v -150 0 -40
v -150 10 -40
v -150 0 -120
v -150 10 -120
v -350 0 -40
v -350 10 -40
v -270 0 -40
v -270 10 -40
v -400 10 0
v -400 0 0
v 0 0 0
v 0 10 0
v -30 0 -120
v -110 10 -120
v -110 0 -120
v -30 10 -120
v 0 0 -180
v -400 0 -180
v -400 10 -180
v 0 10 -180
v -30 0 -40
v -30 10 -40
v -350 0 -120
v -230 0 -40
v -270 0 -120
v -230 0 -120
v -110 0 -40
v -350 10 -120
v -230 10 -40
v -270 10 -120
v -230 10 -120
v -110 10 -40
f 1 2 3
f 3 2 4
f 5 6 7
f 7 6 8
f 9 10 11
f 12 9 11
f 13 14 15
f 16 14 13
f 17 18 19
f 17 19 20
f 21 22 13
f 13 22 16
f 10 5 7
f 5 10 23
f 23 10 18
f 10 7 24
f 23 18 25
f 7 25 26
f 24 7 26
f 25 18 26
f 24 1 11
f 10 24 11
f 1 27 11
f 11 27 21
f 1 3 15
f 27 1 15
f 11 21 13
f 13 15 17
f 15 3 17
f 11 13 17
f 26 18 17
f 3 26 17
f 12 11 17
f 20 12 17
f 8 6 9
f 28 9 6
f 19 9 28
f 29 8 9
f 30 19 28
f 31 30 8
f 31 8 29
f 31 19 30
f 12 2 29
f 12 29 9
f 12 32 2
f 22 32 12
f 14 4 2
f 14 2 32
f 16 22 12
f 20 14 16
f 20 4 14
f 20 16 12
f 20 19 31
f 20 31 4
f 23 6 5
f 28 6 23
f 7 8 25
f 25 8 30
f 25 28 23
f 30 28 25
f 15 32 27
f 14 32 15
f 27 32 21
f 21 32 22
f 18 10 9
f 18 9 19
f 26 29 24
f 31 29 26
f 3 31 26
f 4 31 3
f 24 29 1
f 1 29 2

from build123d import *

# Parameters (mm, degrees)
ESQUISSE1_W             = 400
ESQUISSE1_H             = 180
BOSS_EXTRU_1_DEPTH      = 10
ESQUISSE2_W             = 80
ESQUISSE2_H             = 80
ENL_V_MAT_EXTRU_1_DEPTH = 10


with BuildPart() as part:
    # Esquisse1 → Boss.-Extru.1 (new body)
    with BuildSketch(Plane(origin=(0, 0, 0), x_dir=(1, 0, 0), z_dir=(0, 1, 0))):
        with Locations((-200, 90)):
            Rectangle(ESQUISSE1_W, ESQUISSE1_H)
    extrude(amount=BOSS_EXTRU_1_DEPTH)

    # Esquisse2 → Enlèv. mat.-Extru.1 (cut)
    with BuildSketch(Plane(origin=(0, 10, 0), x_dir=(1, 0, 0), z_dir=(0, 1, 0))):
        with Locations((-310, 80)):
            Rectangle(ESQUISSE2_W, ESQUISSE2_H)
        with Locations((-190, 80)):
            Rectangle(ESQUISSE2_W, ESQUISSE2_H)
        with Locations((-70, 80)):
            Rectangle(ESQUISSE2_W, ESQUISSE2_H)
    extrude(amount=-ENL_V_MAT_EXTRU_1_DEPTH, mode=Mode.SUBTRACT)


solid = part.part
